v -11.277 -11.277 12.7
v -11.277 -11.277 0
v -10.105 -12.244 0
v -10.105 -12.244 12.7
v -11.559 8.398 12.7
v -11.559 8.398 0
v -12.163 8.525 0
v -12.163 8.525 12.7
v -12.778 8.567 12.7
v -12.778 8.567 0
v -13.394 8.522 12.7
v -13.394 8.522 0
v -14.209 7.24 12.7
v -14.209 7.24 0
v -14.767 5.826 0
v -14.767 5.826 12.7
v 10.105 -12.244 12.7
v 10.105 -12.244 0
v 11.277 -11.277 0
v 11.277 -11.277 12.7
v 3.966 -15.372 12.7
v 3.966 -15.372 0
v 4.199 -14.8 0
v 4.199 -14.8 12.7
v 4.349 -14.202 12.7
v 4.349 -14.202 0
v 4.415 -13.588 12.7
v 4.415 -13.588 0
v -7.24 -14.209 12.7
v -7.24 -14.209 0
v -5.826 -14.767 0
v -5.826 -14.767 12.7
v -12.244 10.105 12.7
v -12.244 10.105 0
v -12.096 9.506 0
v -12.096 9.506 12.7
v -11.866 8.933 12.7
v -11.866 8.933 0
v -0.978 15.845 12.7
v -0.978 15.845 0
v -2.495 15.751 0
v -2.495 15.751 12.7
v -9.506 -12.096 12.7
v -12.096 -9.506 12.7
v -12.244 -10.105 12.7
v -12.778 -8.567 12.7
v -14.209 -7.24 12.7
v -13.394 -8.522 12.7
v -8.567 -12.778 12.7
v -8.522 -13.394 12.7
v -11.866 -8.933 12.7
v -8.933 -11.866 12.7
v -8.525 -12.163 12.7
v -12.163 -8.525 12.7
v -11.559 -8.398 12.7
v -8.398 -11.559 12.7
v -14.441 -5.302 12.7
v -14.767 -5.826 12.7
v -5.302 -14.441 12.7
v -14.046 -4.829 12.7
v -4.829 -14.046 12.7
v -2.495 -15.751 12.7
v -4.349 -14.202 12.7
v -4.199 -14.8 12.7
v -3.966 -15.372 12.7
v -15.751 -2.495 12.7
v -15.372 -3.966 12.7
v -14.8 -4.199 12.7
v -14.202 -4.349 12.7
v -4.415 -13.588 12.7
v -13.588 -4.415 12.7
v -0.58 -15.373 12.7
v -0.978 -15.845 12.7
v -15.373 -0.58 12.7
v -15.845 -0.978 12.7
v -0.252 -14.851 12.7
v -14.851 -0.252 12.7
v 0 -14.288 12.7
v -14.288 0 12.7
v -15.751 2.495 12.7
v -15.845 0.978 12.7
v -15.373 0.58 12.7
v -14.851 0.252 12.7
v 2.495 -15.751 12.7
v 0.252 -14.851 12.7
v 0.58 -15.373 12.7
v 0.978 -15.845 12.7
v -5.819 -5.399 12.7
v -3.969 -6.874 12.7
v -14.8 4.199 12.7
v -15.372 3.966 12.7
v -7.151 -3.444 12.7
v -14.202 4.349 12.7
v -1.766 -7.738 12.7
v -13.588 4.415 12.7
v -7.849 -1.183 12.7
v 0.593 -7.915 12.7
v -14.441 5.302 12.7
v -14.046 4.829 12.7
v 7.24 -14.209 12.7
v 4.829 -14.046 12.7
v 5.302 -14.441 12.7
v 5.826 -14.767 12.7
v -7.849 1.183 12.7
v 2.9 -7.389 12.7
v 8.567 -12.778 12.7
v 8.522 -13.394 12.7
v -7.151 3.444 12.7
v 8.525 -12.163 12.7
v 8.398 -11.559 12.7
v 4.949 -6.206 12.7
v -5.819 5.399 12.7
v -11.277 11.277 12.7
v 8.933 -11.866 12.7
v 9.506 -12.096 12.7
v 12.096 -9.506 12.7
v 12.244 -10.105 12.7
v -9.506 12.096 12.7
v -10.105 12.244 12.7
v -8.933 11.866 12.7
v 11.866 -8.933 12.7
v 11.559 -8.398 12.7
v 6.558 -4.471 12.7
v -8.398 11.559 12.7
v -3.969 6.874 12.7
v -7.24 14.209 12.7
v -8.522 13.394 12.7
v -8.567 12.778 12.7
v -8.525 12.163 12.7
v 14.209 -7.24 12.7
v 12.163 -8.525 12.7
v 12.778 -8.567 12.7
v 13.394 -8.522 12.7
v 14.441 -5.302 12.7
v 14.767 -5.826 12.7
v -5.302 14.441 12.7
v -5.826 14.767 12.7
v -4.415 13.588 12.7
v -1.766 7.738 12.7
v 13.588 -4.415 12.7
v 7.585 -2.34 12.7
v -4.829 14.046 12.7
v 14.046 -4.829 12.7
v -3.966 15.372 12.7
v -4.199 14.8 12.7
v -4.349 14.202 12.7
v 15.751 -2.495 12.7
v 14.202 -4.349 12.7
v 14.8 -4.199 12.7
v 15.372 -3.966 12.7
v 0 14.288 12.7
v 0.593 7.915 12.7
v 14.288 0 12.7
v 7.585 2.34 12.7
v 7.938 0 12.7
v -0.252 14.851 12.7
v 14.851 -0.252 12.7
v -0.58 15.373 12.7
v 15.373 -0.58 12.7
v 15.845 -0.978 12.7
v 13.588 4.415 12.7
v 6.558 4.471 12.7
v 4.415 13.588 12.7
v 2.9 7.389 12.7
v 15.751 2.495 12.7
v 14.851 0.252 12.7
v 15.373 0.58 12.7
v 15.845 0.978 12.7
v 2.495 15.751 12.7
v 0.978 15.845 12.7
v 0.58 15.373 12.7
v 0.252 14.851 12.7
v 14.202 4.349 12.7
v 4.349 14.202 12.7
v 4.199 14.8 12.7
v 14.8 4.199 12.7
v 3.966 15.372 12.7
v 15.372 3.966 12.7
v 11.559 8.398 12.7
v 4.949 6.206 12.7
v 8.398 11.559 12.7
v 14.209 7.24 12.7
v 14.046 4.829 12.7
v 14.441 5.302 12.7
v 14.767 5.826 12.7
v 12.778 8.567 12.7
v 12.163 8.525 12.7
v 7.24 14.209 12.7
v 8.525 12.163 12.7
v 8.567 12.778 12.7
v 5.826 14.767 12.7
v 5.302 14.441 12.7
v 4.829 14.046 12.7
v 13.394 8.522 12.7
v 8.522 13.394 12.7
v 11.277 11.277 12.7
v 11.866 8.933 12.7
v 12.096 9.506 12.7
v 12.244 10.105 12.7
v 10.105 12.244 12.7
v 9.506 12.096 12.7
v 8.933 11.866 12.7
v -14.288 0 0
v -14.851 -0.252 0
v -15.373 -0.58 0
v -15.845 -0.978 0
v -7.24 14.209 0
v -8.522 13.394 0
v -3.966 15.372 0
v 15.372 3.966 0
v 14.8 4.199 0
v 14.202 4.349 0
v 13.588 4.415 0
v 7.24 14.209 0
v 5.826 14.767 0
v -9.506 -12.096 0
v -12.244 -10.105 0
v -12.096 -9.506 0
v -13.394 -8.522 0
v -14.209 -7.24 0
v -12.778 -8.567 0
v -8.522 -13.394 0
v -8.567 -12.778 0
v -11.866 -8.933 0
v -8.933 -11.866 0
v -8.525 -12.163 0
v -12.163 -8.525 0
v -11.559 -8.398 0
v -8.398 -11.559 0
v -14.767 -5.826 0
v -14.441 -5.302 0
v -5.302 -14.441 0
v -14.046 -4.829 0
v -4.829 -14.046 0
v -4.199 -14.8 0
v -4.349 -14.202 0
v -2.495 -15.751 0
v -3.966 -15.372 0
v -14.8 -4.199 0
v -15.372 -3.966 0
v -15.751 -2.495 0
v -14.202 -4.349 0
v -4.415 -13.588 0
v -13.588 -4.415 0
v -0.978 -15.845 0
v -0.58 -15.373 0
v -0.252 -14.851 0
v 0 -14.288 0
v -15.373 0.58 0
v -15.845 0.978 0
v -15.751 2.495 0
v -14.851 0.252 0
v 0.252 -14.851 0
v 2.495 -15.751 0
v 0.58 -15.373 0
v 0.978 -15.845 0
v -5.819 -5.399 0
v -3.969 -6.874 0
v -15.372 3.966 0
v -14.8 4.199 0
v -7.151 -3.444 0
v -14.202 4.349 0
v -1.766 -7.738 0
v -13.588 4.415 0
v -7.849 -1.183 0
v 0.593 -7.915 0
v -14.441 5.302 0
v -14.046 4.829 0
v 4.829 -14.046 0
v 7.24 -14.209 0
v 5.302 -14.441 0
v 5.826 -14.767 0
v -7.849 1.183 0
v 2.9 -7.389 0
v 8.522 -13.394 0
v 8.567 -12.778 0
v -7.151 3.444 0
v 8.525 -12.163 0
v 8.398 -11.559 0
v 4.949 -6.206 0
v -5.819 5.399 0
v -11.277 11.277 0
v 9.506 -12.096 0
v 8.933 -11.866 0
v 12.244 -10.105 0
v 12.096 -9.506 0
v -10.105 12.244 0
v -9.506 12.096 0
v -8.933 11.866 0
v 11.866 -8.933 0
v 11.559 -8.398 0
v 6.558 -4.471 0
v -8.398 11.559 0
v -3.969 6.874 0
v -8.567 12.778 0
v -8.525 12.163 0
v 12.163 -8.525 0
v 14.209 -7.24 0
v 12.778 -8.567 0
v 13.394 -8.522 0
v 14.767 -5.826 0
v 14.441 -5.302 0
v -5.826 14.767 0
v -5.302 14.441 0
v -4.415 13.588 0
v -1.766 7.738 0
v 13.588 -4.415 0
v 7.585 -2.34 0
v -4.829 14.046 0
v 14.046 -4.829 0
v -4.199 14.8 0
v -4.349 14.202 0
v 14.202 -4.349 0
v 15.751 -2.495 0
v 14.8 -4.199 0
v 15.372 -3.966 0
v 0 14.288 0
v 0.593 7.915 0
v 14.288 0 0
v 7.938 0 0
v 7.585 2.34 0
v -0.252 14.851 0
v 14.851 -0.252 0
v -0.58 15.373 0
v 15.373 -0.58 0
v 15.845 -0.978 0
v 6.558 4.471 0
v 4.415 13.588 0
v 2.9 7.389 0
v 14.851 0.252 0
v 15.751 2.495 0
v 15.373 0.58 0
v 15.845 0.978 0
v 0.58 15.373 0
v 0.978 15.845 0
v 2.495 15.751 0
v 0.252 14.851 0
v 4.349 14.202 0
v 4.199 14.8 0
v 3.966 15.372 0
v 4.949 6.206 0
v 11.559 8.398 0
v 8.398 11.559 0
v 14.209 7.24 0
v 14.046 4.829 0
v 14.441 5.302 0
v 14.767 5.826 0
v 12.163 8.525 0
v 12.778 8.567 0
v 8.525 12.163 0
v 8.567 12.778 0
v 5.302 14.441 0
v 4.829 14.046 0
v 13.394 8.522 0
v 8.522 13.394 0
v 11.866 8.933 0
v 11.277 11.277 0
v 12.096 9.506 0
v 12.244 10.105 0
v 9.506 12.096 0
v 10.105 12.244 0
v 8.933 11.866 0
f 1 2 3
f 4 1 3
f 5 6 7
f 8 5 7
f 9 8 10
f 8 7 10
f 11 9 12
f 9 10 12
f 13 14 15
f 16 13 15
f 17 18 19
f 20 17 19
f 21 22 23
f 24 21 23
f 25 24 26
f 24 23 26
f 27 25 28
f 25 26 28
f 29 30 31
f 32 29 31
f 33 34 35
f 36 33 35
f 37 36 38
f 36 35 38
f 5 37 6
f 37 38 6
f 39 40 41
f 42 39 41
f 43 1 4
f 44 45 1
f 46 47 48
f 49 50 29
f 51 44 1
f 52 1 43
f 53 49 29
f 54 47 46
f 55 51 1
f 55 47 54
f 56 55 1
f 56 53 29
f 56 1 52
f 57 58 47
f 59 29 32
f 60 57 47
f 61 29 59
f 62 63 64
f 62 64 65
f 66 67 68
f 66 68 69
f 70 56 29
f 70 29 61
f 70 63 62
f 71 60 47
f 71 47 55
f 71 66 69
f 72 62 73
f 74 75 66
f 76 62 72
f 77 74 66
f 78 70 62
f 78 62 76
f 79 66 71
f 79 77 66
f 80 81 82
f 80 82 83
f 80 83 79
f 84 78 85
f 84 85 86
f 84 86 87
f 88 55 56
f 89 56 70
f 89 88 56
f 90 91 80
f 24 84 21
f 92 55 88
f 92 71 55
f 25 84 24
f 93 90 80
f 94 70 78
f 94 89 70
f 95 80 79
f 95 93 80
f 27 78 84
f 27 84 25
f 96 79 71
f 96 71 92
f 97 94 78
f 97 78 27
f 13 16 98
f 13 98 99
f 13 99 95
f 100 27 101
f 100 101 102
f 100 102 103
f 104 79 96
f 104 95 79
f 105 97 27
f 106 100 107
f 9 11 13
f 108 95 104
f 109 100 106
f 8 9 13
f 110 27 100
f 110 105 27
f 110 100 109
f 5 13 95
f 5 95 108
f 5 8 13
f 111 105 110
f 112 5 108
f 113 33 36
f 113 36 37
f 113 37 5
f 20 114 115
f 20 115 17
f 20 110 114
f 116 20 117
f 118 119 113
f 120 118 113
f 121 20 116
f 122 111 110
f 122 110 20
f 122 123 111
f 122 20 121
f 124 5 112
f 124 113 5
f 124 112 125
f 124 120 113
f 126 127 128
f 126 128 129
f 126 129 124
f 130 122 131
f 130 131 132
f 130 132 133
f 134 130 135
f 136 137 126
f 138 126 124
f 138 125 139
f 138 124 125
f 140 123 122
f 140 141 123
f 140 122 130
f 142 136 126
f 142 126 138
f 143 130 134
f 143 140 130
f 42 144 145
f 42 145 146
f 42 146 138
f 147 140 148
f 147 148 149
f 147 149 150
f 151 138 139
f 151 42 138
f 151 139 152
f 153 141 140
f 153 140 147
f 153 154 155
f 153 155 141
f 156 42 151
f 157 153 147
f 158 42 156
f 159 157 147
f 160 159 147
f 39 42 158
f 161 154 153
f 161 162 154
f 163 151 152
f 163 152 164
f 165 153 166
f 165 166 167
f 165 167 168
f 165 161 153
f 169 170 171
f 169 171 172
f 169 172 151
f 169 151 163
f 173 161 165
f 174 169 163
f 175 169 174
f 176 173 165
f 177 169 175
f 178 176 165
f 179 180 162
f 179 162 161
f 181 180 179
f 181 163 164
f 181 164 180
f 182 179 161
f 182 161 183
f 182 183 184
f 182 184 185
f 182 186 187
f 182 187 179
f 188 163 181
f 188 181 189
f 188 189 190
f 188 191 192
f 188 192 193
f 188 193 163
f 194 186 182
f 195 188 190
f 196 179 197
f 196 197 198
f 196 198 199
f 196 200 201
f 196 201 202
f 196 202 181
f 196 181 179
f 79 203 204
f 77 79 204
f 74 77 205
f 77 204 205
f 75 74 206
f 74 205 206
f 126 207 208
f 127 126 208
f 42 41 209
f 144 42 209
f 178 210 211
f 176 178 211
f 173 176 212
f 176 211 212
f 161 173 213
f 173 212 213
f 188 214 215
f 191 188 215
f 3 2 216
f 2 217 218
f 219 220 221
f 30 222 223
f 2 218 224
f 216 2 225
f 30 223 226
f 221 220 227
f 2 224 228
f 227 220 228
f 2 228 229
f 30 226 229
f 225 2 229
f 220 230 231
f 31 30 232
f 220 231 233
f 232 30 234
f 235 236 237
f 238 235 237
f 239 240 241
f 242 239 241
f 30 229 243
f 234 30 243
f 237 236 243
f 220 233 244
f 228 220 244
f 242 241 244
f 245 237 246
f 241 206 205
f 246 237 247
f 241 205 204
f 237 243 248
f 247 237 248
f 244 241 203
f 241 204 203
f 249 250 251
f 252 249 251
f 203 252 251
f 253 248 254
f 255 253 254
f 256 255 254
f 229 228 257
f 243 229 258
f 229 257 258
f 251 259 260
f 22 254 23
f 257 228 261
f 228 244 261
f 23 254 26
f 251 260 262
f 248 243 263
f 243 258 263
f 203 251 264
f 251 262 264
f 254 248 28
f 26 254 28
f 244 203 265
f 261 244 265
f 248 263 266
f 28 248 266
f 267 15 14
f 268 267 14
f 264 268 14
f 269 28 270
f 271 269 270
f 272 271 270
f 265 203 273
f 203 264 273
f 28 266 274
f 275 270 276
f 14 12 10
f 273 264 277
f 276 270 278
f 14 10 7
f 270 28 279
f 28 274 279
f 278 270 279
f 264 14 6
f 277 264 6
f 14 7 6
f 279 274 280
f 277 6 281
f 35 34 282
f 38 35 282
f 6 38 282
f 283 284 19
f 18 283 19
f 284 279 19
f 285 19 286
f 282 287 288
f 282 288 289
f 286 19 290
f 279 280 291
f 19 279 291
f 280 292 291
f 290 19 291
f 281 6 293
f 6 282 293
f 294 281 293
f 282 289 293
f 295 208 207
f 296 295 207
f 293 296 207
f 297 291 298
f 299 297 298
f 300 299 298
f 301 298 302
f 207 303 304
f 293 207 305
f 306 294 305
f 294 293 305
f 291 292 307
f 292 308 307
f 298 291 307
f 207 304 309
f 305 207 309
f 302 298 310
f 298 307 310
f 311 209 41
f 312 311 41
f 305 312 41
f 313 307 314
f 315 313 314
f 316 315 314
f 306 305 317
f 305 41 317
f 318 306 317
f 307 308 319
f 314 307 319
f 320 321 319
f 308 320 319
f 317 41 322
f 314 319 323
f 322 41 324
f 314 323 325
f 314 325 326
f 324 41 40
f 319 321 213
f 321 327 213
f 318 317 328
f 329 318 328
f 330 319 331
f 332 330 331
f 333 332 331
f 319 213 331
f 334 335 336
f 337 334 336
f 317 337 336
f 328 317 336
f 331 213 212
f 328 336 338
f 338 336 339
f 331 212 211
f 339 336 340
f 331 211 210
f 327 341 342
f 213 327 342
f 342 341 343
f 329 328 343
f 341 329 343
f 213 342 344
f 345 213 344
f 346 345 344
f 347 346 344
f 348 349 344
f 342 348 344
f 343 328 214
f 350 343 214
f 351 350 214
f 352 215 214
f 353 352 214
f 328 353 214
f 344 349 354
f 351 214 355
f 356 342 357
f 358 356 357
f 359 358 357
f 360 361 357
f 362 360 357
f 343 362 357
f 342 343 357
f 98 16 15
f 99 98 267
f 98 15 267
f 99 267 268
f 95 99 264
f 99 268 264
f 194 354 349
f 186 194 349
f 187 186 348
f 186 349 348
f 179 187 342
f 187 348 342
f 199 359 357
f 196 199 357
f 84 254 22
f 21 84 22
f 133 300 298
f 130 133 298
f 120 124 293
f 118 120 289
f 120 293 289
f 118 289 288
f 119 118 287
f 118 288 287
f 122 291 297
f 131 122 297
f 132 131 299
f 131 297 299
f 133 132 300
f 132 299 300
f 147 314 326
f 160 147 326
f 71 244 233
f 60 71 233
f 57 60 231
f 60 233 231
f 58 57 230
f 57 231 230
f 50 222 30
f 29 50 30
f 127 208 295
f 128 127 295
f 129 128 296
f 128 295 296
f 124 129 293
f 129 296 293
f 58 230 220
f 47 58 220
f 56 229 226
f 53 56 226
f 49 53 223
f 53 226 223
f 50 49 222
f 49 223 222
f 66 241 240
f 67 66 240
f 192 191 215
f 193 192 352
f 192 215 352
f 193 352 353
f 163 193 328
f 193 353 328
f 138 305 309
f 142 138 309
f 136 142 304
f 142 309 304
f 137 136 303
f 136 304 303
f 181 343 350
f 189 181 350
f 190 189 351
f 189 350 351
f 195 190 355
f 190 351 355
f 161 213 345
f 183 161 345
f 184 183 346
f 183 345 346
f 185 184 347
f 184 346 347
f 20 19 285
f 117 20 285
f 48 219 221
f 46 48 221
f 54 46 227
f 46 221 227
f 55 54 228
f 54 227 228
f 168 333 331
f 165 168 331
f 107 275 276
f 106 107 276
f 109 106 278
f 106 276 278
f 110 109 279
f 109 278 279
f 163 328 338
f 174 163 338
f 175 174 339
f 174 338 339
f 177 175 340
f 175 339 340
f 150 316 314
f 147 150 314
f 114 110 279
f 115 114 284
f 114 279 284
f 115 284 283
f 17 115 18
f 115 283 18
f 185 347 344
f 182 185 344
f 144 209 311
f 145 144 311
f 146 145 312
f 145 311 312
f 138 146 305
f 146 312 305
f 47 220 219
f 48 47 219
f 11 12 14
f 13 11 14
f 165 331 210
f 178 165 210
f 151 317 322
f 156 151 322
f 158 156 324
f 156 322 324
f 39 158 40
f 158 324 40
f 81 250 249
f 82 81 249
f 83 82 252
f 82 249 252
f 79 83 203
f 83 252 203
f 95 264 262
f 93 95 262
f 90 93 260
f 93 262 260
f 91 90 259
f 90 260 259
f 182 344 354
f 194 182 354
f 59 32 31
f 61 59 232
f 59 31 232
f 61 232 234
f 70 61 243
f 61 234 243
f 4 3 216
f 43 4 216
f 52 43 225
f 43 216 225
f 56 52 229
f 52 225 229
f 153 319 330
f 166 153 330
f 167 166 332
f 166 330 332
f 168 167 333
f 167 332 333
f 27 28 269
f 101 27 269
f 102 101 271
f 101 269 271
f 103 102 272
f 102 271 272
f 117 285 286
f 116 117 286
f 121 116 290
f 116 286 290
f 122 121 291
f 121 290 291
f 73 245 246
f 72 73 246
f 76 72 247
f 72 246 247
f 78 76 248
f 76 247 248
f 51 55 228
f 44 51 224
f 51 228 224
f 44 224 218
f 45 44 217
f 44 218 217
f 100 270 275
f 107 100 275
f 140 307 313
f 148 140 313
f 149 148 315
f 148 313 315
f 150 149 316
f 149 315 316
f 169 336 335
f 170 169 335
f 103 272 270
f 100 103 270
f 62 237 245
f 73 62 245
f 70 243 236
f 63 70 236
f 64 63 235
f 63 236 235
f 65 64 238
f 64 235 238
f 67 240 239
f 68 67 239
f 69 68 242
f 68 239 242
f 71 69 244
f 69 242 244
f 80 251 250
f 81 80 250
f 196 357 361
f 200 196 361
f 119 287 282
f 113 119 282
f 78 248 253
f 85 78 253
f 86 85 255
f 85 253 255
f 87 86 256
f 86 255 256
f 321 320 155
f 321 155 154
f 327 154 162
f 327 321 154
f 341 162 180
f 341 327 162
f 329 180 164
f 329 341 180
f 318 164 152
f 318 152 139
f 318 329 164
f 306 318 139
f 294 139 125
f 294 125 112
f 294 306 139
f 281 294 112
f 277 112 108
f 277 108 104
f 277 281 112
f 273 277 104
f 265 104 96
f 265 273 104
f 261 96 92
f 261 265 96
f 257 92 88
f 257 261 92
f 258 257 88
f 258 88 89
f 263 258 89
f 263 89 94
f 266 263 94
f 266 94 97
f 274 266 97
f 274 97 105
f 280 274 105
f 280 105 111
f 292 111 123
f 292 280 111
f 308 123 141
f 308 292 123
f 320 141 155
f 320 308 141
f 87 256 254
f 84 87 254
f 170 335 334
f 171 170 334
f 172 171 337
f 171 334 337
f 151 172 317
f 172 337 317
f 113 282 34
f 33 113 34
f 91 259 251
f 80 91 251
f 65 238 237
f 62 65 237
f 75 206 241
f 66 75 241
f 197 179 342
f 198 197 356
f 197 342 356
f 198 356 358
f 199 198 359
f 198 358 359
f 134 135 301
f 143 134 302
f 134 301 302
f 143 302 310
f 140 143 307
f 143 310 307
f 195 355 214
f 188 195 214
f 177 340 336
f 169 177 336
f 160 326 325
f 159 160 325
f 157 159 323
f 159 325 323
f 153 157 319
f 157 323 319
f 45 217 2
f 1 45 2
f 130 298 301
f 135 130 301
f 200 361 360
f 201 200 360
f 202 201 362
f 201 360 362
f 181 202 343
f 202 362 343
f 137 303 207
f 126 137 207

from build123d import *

# Parameters (mm, degrees)
F0_R     = 7.9375
F1_DEPTH = 12.7


with BuildPart() as f1:
    # F0 (on Top) → F1 (new body)
    with BuildSketch(Plane.XY):
        with BuildLine():
            ThreePointArc((0.977976, 15.844847), (0.407007, 15.117656), (0, 14.2875))
            ThreePointArc((0, 14.2875), (-0.407007, 15.117656), (-0.977976, 15.844847))
            Line((-0.977976, 15.844847), (-2.49475, 15.751229))
            Line((-2.49475, 15.751229), (-3.966216, 15.371557))
            ThreePointArc((-3.966216, 15.371557), (-4.284526, 14.503517), (-4.41508, 13.58822))
            ThreePointArc((-4.41508, 13.58822), (-5.058699, 14.251973), (-5.826438, 14.767134))
            Line((-5.826438, 14.767134), (-7.240045, 14.209389))
            Line((-7.240045, 14.209389), (-8.522168, 13.393591))
            ThreePointArc((-8.522168, 13.393591), (-8.55666, 12.469673), (-8.397982, 11.55883))
            ThreePointArc((-8.397982, 11.55883), (-9.215211, 11.991208), (-10.104567, 12.243911))
            Line((-10.104567, 12.243911), (-11.276635, 11.276635))
            Line((-11.276635, 11.276635), (-12.243911, 10.104567))
            ThreePointArc((-12.243911, 10.104567), (-11.991208, 9.215211), (-11.55883, 8.397982))
            ThreePointArc((-11.55883, 8.397982), (-12.469673, 8.55666), (-13.393591, 8.522168))
            Line((-13.393591, 8.522168), (-14.209389, 7.240045))
            Line((-14.209389, 7.240045), (-14.767134, 5.826438))
            ThreePointArc((-14.767134, 5.826438), (-14.251973, 5.058699), (-13.58822, 4.41508))
            ThreePointArc((-13.58822, 4.41508), (-14.503517, 4.284526), (-15.371557, 3.966216))
            Line((-15.371557, 3.966216), (-15.751229, 2.49475))
            Line((-15.751229, 2.49475), (-15.844847, 0.977976))
            ThreePointArc((-15.844847, 0.977976), (-15.117656, 0.407007), (-14.2875, 0))
            ThreePointArc((-14.2875, 0), (-15.117656, -0.407007), (-15.844847, -0.977976))
            Line((-15.844847, -0.977976), (-15.751229, -2.49475))
            Line((-15.751229, -2.49475), (-15.371557, -3.966216))
            ThreePointArc((-15.371557, -3.966216), (-14.503517, -4.284526), (-13.58822, -4.41508))
            ThreePointArc((-13.58822, -4.41508), (-14.251973, -5.058699), (-14.767134, -5.826438))
            Line((-14.767134, -5.826438), (-14.209389, -7.240045))
            Line((-14.209389, -7.240045), (-13.393591, -8.522168))
            ThreePointArc((-13.393591, -8.522168), (-12.469673, -8.55666), (-11.55883, -8.397982))
            ThreePointArc((-11.55883, -8.397982), (-11.991208, -9.215211), (-12.243911, -10.104567))
            Line((-12.243911, -10.104567), (-11.276635, -11.276635))
            Line((-11.276635, -11.276635), (-10.104567, -12.243911))
            ThreePointArc((-10.104567, -12.243911), (-9.215211, -11.991208), (-8.397982, -11.55883))
            ThreePointArc((-8.397982, -11.55883), (-8.55666, -12.469673), (-8.522168, -13.393591))
            Line((-8.522168, -13.393591), (-7.240045, -14.209389))
            Line((-7.240045, -14.209389), (-5.826438, -14.767134))
            ThreePointArc((-5.826438, -14.767134), (-5.058699, -14.251973), (-4.41508, -13.58822))
            ThreePointArc((-4.41508, -13.58822), (-4.284526, -14.503517), (-3.966216, -15.371557))
            Line((-3.966216, -15.371557), (-2.49475, -15.751229))
            Line((-2.49475, -15.751229), (-0.977976, -15.844847))
            ThreePointArc((-0.977976, -15.844847), (-0.407007, -15.117656), (0, -14.2875))
            ThreePointArc((0, -14.2875), (0.407007, -15.117656), (0.977976, -15.844847))
            Line((0.977976, -15.844847), (2.49475, -15.751229))
            Line((2.49475, -15.751229), (3.966216, -15.371557))
            ThreePointArc((3.966216, -15.371557), (4.284526, -14.503517), (4.41508, -13.58822))
            ThreePointArc((4.41508, -13.58822), (5.058699, -14.251973), (5.826438, -14.767134))
            Line((5.826438, -14.767134), (7.240045, -14.209389))
            Line((7.240045, -14.209389), (8.522168, -13.393591))
            ThreePointArc((8.522168, -13.393591), (8.55666, -12.469673), (8.397982, -11.55883))
            ThreePointArc((8.397982, -11.55883), (9.215211, -11.991208), (10.104567, -12.243911))
            Line((10.104567, -12.243911), (11.276635, -11.276635))
            Line((11.276635, -11.276635), (12.243911, -10.104567))
            ThreePointArc((12.243911, -10.104567), (11.991208, -9.215211), (11.55883, -8.397982))
            ThreePointArc((11.55883, -8.397982), (12.469673, -8.55666), (13.393591, -8.522168))
            Line((13.393591, -8.522168), (14.209389, -7.240045))
            Line((14.209389, -7.240045), (14.767134, -5.826438))
            ThreePointArc((14.767134, -5.826438), (14.251973, -5.058699), (13.58822, -4.41508))
            ThreePointArc((13.58822, -4.41508), (14.503517, -4.284526), (15.371557, -3.966216))
            Line((15.371557, -3.966216), (15.751229, -2.49475))
            Line((15.751229, -2.49475), (15.844847, -0.977976))
            ThreePointArc((15.844847, -0.977976), (15.117656, -0.407007), (14.2875, 0))
            ThreePointArc((14.2875, 0), (15.117656, 0.407007), (15.844847, 0.977976))
            Line((15.844847, 0.977976), (15.751229, 2.49475))
            Line((15.751229, 2.49475), (15.371557, 3.966216))
            ThreePointArc((15.371557, 3.966216), (14.503517, 4.284526), (13.58822, 4.41508))
            ThreePointArc((13.58822, 4.41508), (14.251973, 5.058699), (14.767134, 5.826438))
            Line((14.767134, 5.826438), (14.209389, 7.240045))
            Line((14.209389, 7.240045), (13.393591, 8.522168))
            ThreePointArc((13.393591, 8.522168), (12.469673, 8.55666), (11.55883, 8.397982))
            ThreePointArc((11.55883, 8.397982), (11.991208, 9.215211), (12.243911, 10.104567))
            Line((12.243911, 10.104567), (11.276635, 11.276635))
            Line((11.276635, 11.276635), (10.104567, 12.243911))
            ThreePointArc((10.104567, 12.243911), (9.215211, 11.991208), (8.397982, 11.55883))
            ThreePointArc((8.397982, 11.55883), (8.55666, 12.469673), (8.522168, 13.393591))
            Line((8.522168, 13.393591), (7.240045, 14.209389))
            Line((7.240045, 14.209389), (5.826438, 14.767134))
            ThreePointArc((5.826438, 14.767134), (5.058699, 14.251973), (4.41508, 13.58822))
            ThreePointArc((4.41508, 13.58822), (4.284526, 14.503517), (3.966216, 15.371557))
            Line((3.966216, 15.371557), (2.49475, 15.751229))
            Line((2.49475, 15.751229), (0.977976, 15.844847))
        make_face()
        Circle(F0_R, mode=Mode.SUBTRACT)
    extrude(amount=F1_DEPTH)


solid = f1.part
